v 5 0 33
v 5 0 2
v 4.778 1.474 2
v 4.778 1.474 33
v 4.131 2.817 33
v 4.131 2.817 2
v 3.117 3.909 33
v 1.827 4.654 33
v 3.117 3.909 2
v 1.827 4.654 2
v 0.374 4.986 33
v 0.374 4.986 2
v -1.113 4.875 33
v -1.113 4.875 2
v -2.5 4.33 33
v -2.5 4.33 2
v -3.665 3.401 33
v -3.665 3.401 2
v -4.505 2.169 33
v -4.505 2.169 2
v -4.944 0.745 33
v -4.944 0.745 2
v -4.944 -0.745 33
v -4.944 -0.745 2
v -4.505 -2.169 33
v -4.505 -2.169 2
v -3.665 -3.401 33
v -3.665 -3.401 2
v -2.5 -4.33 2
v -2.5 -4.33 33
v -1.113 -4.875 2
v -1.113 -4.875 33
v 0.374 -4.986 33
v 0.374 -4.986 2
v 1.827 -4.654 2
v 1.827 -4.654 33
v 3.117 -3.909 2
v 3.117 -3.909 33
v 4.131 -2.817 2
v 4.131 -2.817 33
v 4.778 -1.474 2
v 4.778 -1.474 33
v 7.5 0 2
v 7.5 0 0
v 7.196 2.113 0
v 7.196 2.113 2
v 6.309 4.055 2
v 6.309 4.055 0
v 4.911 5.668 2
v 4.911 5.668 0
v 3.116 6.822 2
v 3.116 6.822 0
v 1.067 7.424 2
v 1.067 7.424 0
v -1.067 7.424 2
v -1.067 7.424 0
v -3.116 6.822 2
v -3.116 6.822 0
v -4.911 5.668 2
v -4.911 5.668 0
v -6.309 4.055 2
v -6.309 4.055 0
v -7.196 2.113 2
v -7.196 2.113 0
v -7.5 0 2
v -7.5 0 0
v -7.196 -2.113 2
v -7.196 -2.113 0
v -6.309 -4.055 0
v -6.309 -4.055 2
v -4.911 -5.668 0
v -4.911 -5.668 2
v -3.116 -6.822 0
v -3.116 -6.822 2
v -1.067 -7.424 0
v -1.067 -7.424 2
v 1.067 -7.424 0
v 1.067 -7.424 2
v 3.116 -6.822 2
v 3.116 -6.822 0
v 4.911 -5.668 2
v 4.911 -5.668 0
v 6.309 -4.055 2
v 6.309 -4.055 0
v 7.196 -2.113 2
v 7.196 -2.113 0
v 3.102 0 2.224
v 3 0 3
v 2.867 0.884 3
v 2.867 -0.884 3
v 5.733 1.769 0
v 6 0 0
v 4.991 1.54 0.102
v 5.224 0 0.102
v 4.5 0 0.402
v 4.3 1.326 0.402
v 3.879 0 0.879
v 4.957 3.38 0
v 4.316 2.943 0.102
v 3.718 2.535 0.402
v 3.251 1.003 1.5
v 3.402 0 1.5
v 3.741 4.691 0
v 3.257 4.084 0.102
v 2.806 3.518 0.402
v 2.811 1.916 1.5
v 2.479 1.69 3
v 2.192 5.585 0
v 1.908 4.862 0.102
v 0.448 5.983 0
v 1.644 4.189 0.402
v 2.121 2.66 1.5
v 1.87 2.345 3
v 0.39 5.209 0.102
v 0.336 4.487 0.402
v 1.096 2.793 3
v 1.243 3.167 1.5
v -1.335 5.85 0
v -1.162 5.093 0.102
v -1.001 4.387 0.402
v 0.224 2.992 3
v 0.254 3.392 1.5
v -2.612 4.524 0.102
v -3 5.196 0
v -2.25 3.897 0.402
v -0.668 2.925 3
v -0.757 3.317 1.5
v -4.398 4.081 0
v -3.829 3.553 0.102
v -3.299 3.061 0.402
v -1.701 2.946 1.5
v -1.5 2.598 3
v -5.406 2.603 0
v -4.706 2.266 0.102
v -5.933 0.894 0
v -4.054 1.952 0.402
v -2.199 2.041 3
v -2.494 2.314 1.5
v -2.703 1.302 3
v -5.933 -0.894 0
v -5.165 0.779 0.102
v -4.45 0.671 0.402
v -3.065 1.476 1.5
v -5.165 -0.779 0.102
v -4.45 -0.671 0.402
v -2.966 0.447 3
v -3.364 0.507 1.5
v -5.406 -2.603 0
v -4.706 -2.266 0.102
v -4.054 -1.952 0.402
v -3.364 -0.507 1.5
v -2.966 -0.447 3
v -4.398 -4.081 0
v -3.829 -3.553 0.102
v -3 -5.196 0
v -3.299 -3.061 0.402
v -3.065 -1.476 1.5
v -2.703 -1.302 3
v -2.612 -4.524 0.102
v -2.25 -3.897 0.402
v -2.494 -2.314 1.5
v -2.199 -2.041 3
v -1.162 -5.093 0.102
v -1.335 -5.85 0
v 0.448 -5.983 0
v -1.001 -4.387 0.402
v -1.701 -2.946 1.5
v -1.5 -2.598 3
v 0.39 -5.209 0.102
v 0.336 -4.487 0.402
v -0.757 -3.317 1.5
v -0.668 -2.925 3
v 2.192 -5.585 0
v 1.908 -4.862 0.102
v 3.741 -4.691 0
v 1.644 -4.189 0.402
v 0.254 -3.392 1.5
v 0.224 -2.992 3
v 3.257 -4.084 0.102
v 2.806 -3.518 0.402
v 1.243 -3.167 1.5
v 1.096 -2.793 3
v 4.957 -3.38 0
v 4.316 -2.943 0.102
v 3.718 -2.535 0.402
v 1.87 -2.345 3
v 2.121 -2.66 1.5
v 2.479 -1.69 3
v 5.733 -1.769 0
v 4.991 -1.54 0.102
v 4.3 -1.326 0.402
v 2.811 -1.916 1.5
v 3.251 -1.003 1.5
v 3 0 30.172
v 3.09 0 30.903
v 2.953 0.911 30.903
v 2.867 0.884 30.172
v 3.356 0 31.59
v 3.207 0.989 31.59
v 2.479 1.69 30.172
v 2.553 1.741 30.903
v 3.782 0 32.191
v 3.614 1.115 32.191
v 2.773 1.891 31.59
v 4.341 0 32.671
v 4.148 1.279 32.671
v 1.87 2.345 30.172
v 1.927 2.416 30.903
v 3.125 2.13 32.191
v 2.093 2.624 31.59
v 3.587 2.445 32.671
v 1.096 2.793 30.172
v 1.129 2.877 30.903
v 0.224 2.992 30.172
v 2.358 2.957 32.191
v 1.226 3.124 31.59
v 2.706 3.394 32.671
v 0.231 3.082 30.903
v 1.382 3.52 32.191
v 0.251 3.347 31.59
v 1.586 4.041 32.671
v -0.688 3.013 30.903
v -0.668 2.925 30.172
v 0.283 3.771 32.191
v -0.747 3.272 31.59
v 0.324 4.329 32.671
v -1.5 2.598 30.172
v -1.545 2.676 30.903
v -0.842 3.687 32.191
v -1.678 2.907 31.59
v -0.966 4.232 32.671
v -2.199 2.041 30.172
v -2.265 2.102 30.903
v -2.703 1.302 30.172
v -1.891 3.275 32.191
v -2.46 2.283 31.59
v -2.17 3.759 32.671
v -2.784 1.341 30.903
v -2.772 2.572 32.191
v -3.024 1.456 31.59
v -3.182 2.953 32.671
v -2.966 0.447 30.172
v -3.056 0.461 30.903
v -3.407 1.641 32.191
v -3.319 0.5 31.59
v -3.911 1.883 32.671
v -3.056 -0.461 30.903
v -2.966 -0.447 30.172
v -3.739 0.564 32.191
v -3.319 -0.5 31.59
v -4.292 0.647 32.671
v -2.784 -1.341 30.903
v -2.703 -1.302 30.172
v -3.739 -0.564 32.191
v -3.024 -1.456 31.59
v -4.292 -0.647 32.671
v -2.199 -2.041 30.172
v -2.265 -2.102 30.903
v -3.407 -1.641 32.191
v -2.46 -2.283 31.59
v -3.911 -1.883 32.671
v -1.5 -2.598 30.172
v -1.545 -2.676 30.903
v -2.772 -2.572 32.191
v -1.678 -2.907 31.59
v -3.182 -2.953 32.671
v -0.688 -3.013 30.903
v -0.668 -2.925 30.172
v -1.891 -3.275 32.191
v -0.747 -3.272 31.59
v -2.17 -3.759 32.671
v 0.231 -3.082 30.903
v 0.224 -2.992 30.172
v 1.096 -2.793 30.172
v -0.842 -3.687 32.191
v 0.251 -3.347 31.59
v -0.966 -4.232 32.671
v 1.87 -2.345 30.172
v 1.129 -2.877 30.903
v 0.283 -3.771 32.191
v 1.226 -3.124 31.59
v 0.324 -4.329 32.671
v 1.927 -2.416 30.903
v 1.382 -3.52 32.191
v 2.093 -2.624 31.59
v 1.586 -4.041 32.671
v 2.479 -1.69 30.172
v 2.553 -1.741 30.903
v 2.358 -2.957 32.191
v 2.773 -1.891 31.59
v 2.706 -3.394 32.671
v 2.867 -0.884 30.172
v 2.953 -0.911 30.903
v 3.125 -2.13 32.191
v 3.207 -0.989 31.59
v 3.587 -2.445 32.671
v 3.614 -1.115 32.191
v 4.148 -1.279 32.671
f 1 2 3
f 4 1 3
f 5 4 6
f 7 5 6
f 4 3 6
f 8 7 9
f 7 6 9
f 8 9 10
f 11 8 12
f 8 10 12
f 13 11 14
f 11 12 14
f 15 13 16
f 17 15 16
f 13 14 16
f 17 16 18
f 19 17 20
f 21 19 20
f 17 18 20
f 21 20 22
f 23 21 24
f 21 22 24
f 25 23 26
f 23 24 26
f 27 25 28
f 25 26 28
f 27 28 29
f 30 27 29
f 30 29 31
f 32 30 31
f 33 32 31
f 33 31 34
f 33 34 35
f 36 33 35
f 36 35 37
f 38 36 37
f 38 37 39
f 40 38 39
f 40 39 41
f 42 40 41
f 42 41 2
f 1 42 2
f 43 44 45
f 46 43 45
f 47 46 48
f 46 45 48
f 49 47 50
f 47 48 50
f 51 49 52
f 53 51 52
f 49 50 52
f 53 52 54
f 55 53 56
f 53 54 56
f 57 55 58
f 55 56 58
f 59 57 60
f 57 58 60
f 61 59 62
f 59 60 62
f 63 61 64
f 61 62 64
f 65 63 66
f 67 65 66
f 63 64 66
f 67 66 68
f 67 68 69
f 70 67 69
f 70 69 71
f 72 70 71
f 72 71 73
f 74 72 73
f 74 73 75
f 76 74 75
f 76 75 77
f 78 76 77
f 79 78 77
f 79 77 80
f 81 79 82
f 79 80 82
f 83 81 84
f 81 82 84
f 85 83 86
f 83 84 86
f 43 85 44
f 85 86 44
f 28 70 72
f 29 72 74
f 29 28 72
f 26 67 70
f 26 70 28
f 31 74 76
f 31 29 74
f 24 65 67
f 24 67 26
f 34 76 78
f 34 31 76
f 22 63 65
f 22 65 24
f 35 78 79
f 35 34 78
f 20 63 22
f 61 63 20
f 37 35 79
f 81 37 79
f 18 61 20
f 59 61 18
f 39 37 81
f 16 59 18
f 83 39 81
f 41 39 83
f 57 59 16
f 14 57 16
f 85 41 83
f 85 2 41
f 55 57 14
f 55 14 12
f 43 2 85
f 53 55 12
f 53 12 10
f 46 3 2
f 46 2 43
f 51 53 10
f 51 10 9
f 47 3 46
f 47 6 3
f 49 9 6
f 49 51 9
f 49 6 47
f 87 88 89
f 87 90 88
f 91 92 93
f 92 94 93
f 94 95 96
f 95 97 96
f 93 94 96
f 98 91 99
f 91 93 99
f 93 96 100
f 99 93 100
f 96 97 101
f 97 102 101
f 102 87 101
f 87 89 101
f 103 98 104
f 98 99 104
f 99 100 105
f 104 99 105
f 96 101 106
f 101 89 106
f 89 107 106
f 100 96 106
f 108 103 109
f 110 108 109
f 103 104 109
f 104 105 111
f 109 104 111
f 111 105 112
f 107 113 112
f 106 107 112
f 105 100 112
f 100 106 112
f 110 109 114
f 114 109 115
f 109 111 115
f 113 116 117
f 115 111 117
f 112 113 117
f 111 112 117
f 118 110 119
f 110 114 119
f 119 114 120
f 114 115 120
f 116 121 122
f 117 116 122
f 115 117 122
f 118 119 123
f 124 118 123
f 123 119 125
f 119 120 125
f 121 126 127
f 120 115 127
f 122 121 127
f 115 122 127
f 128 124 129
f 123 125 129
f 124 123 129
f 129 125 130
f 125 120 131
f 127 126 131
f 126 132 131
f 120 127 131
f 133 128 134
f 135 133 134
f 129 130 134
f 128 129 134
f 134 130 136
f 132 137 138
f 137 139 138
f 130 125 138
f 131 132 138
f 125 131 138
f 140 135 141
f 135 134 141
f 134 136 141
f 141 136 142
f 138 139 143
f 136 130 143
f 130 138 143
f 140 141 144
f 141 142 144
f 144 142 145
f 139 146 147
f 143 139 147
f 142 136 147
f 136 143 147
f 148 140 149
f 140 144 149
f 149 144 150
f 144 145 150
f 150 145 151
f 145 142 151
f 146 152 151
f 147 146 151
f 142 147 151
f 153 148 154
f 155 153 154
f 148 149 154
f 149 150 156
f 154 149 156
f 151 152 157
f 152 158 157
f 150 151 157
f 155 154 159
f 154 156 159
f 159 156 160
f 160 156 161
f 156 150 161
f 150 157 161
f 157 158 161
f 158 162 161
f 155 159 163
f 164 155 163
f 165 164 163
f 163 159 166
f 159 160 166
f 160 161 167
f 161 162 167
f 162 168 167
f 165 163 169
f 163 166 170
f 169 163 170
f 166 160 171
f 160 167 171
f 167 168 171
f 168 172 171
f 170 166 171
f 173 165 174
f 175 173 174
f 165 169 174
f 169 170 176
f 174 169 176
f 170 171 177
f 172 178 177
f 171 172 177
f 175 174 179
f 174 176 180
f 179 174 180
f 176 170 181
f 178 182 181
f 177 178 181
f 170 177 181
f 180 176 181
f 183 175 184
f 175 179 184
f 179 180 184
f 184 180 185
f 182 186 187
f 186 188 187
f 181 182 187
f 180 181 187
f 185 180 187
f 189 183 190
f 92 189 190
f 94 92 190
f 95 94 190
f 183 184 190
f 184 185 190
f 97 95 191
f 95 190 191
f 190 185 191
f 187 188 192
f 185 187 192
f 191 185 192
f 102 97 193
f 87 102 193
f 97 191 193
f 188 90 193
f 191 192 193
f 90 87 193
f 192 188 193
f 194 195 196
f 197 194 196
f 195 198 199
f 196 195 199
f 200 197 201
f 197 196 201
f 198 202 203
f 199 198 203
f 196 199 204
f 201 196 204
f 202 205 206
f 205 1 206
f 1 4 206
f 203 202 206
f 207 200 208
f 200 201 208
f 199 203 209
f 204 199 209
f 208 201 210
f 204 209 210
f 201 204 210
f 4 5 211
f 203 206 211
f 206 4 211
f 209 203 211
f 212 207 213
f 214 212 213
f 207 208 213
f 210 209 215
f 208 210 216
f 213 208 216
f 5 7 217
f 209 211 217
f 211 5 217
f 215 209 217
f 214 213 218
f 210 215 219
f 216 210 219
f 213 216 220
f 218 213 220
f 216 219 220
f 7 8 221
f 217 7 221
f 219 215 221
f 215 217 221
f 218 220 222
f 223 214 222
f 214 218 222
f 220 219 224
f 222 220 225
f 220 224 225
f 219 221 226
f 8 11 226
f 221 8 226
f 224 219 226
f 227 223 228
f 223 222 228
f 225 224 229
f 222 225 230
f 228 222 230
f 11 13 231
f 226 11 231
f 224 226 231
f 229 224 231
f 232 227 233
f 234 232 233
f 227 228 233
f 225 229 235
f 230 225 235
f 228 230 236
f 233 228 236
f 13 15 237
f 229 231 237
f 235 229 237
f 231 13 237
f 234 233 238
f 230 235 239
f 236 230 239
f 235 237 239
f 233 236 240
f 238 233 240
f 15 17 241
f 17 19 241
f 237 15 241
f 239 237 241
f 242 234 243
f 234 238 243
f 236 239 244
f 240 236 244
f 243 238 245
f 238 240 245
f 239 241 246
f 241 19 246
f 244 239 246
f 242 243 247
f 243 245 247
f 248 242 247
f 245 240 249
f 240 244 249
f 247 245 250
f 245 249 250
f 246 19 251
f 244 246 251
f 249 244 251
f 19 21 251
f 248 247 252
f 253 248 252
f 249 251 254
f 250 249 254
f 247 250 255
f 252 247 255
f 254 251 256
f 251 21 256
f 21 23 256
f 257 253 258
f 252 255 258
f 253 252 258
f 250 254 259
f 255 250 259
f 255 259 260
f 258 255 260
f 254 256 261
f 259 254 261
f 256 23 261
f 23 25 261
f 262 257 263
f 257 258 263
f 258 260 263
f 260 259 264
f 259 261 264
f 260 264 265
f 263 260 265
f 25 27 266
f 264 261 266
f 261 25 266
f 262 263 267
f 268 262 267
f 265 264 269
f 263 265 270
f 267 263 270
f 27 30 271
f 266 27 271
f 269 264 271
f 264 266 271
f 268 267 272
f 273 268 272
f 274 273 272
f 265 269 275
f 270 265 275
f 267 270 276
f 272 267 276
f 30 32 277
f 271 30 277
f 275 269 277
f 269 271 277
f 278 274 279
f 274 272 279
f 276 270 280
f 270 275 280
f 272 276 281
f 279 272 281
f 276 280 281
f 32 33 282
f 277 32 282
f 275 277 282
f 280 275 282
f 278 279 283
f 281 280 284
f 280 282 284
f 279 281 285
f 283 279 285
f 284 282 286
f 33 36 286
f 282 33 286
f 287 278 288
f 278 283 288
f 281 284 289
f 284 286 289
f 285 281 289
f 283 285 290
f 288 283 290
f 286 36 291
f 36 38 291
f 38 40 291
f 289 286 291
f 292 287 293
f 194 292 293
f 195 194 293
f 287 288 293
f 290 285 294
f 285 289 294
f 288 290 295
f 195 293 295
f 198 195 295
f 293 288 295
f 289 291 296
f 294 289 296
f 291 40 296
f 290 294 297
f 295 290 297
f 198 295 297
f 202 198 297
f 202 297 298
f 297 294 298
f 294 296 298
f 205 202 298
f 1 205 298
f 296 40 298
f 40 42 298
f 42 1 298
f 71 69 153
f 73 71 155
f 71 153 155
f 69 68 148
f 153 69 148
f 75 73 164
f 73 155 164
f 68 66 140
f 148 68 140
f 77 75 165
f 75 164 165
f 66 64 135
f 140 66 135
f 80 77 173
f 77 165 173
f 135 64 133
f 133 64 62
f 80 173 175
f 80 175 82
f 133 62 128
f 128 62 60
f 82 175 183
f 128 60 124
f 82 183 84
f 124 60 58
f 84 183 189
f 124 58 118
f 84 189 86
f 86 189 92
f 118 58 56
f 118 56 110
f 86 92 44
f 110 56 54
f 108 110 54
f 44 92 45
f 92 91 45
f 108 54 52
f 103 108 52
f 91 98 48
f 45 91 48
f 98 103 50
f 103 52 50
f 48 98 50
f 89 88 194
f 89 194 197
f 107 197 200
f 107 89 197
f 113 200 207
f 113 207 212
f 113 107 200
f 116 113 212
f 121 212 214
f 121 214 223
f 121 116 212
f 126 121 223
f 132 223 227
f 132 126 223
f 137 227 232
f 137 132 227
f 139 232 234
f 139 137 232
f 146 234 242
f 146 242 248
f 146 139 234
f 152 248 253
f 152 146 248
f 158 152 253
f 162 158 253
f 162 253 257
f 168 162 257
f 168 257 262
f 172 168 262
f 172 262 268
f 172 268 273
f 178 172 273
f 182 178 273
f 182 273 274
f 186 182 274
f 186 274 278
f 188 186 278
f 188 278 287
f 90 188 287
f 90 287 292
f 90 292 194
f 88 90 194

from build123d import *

# Parameters (mm, degrees)
F0_R     = 7.5
F0_R_2   = 5
F1_DEPTH = 2
F0_R_3   = 3
F2_DEPTH = 33


# Not quite as in the source:
# - a fillet or chamfer that OpenCascade refuses, or shapes differently, is made with other operations: its cross-section is extruded or revolved along the edge and cut away or added


with BuildPart() as f1:
    # F0 (on Top) → F1 (new body)
    with BuildSketch(Plane.XY):
        Circle(F0_R)
        Circle(F0_R_2, mode=Mode.SUBTRACT)
    extrude(amount=F1_DEPTH)

    # F0 (on Top) → F2 (join)
    with BuildSketch(Plane.XY):
        Circle(F0_R_2)
        Circle(F0_R_3, mode=Mode.SUBTRACT)
    extrude(amount=F2_DEPTH)

    # F3: fillet of radius 3 on 2 edges, made by hand

    # F3_s1 → F3_t2 (revolve, cut)
    with BuildSketch(Plane.XZ):
        with BuildLine():
            ThreePointArc((6, 0), (3.8786796564, 0.8786796564), (3, 3))
            Line((3, 3), (3, 0))
            Line((3, 0), (6, 0))
        make_face()
    revolve(axis=Axis((0, 0, 0), (0, 0, 1)), mode=Mode.SUBTRACT)

    # F3_s3 → F3_t4 (revolve, cut)
    with BuildSketch(Plane.XZ):
        with BuildLine():
            ThreePointArc((3, 30.1715728753), (3.5505102572, 31.9036236828), (5, 33))
            Line((5, 33), (3, 33))
            Line((3, 33), (3, 30.1715728753))
        make_face()
    revolve(axis=Axis((0, 0, 33), (0, 0, 1)), mode=Mode.SUBTRACT)


solid = f1.part
